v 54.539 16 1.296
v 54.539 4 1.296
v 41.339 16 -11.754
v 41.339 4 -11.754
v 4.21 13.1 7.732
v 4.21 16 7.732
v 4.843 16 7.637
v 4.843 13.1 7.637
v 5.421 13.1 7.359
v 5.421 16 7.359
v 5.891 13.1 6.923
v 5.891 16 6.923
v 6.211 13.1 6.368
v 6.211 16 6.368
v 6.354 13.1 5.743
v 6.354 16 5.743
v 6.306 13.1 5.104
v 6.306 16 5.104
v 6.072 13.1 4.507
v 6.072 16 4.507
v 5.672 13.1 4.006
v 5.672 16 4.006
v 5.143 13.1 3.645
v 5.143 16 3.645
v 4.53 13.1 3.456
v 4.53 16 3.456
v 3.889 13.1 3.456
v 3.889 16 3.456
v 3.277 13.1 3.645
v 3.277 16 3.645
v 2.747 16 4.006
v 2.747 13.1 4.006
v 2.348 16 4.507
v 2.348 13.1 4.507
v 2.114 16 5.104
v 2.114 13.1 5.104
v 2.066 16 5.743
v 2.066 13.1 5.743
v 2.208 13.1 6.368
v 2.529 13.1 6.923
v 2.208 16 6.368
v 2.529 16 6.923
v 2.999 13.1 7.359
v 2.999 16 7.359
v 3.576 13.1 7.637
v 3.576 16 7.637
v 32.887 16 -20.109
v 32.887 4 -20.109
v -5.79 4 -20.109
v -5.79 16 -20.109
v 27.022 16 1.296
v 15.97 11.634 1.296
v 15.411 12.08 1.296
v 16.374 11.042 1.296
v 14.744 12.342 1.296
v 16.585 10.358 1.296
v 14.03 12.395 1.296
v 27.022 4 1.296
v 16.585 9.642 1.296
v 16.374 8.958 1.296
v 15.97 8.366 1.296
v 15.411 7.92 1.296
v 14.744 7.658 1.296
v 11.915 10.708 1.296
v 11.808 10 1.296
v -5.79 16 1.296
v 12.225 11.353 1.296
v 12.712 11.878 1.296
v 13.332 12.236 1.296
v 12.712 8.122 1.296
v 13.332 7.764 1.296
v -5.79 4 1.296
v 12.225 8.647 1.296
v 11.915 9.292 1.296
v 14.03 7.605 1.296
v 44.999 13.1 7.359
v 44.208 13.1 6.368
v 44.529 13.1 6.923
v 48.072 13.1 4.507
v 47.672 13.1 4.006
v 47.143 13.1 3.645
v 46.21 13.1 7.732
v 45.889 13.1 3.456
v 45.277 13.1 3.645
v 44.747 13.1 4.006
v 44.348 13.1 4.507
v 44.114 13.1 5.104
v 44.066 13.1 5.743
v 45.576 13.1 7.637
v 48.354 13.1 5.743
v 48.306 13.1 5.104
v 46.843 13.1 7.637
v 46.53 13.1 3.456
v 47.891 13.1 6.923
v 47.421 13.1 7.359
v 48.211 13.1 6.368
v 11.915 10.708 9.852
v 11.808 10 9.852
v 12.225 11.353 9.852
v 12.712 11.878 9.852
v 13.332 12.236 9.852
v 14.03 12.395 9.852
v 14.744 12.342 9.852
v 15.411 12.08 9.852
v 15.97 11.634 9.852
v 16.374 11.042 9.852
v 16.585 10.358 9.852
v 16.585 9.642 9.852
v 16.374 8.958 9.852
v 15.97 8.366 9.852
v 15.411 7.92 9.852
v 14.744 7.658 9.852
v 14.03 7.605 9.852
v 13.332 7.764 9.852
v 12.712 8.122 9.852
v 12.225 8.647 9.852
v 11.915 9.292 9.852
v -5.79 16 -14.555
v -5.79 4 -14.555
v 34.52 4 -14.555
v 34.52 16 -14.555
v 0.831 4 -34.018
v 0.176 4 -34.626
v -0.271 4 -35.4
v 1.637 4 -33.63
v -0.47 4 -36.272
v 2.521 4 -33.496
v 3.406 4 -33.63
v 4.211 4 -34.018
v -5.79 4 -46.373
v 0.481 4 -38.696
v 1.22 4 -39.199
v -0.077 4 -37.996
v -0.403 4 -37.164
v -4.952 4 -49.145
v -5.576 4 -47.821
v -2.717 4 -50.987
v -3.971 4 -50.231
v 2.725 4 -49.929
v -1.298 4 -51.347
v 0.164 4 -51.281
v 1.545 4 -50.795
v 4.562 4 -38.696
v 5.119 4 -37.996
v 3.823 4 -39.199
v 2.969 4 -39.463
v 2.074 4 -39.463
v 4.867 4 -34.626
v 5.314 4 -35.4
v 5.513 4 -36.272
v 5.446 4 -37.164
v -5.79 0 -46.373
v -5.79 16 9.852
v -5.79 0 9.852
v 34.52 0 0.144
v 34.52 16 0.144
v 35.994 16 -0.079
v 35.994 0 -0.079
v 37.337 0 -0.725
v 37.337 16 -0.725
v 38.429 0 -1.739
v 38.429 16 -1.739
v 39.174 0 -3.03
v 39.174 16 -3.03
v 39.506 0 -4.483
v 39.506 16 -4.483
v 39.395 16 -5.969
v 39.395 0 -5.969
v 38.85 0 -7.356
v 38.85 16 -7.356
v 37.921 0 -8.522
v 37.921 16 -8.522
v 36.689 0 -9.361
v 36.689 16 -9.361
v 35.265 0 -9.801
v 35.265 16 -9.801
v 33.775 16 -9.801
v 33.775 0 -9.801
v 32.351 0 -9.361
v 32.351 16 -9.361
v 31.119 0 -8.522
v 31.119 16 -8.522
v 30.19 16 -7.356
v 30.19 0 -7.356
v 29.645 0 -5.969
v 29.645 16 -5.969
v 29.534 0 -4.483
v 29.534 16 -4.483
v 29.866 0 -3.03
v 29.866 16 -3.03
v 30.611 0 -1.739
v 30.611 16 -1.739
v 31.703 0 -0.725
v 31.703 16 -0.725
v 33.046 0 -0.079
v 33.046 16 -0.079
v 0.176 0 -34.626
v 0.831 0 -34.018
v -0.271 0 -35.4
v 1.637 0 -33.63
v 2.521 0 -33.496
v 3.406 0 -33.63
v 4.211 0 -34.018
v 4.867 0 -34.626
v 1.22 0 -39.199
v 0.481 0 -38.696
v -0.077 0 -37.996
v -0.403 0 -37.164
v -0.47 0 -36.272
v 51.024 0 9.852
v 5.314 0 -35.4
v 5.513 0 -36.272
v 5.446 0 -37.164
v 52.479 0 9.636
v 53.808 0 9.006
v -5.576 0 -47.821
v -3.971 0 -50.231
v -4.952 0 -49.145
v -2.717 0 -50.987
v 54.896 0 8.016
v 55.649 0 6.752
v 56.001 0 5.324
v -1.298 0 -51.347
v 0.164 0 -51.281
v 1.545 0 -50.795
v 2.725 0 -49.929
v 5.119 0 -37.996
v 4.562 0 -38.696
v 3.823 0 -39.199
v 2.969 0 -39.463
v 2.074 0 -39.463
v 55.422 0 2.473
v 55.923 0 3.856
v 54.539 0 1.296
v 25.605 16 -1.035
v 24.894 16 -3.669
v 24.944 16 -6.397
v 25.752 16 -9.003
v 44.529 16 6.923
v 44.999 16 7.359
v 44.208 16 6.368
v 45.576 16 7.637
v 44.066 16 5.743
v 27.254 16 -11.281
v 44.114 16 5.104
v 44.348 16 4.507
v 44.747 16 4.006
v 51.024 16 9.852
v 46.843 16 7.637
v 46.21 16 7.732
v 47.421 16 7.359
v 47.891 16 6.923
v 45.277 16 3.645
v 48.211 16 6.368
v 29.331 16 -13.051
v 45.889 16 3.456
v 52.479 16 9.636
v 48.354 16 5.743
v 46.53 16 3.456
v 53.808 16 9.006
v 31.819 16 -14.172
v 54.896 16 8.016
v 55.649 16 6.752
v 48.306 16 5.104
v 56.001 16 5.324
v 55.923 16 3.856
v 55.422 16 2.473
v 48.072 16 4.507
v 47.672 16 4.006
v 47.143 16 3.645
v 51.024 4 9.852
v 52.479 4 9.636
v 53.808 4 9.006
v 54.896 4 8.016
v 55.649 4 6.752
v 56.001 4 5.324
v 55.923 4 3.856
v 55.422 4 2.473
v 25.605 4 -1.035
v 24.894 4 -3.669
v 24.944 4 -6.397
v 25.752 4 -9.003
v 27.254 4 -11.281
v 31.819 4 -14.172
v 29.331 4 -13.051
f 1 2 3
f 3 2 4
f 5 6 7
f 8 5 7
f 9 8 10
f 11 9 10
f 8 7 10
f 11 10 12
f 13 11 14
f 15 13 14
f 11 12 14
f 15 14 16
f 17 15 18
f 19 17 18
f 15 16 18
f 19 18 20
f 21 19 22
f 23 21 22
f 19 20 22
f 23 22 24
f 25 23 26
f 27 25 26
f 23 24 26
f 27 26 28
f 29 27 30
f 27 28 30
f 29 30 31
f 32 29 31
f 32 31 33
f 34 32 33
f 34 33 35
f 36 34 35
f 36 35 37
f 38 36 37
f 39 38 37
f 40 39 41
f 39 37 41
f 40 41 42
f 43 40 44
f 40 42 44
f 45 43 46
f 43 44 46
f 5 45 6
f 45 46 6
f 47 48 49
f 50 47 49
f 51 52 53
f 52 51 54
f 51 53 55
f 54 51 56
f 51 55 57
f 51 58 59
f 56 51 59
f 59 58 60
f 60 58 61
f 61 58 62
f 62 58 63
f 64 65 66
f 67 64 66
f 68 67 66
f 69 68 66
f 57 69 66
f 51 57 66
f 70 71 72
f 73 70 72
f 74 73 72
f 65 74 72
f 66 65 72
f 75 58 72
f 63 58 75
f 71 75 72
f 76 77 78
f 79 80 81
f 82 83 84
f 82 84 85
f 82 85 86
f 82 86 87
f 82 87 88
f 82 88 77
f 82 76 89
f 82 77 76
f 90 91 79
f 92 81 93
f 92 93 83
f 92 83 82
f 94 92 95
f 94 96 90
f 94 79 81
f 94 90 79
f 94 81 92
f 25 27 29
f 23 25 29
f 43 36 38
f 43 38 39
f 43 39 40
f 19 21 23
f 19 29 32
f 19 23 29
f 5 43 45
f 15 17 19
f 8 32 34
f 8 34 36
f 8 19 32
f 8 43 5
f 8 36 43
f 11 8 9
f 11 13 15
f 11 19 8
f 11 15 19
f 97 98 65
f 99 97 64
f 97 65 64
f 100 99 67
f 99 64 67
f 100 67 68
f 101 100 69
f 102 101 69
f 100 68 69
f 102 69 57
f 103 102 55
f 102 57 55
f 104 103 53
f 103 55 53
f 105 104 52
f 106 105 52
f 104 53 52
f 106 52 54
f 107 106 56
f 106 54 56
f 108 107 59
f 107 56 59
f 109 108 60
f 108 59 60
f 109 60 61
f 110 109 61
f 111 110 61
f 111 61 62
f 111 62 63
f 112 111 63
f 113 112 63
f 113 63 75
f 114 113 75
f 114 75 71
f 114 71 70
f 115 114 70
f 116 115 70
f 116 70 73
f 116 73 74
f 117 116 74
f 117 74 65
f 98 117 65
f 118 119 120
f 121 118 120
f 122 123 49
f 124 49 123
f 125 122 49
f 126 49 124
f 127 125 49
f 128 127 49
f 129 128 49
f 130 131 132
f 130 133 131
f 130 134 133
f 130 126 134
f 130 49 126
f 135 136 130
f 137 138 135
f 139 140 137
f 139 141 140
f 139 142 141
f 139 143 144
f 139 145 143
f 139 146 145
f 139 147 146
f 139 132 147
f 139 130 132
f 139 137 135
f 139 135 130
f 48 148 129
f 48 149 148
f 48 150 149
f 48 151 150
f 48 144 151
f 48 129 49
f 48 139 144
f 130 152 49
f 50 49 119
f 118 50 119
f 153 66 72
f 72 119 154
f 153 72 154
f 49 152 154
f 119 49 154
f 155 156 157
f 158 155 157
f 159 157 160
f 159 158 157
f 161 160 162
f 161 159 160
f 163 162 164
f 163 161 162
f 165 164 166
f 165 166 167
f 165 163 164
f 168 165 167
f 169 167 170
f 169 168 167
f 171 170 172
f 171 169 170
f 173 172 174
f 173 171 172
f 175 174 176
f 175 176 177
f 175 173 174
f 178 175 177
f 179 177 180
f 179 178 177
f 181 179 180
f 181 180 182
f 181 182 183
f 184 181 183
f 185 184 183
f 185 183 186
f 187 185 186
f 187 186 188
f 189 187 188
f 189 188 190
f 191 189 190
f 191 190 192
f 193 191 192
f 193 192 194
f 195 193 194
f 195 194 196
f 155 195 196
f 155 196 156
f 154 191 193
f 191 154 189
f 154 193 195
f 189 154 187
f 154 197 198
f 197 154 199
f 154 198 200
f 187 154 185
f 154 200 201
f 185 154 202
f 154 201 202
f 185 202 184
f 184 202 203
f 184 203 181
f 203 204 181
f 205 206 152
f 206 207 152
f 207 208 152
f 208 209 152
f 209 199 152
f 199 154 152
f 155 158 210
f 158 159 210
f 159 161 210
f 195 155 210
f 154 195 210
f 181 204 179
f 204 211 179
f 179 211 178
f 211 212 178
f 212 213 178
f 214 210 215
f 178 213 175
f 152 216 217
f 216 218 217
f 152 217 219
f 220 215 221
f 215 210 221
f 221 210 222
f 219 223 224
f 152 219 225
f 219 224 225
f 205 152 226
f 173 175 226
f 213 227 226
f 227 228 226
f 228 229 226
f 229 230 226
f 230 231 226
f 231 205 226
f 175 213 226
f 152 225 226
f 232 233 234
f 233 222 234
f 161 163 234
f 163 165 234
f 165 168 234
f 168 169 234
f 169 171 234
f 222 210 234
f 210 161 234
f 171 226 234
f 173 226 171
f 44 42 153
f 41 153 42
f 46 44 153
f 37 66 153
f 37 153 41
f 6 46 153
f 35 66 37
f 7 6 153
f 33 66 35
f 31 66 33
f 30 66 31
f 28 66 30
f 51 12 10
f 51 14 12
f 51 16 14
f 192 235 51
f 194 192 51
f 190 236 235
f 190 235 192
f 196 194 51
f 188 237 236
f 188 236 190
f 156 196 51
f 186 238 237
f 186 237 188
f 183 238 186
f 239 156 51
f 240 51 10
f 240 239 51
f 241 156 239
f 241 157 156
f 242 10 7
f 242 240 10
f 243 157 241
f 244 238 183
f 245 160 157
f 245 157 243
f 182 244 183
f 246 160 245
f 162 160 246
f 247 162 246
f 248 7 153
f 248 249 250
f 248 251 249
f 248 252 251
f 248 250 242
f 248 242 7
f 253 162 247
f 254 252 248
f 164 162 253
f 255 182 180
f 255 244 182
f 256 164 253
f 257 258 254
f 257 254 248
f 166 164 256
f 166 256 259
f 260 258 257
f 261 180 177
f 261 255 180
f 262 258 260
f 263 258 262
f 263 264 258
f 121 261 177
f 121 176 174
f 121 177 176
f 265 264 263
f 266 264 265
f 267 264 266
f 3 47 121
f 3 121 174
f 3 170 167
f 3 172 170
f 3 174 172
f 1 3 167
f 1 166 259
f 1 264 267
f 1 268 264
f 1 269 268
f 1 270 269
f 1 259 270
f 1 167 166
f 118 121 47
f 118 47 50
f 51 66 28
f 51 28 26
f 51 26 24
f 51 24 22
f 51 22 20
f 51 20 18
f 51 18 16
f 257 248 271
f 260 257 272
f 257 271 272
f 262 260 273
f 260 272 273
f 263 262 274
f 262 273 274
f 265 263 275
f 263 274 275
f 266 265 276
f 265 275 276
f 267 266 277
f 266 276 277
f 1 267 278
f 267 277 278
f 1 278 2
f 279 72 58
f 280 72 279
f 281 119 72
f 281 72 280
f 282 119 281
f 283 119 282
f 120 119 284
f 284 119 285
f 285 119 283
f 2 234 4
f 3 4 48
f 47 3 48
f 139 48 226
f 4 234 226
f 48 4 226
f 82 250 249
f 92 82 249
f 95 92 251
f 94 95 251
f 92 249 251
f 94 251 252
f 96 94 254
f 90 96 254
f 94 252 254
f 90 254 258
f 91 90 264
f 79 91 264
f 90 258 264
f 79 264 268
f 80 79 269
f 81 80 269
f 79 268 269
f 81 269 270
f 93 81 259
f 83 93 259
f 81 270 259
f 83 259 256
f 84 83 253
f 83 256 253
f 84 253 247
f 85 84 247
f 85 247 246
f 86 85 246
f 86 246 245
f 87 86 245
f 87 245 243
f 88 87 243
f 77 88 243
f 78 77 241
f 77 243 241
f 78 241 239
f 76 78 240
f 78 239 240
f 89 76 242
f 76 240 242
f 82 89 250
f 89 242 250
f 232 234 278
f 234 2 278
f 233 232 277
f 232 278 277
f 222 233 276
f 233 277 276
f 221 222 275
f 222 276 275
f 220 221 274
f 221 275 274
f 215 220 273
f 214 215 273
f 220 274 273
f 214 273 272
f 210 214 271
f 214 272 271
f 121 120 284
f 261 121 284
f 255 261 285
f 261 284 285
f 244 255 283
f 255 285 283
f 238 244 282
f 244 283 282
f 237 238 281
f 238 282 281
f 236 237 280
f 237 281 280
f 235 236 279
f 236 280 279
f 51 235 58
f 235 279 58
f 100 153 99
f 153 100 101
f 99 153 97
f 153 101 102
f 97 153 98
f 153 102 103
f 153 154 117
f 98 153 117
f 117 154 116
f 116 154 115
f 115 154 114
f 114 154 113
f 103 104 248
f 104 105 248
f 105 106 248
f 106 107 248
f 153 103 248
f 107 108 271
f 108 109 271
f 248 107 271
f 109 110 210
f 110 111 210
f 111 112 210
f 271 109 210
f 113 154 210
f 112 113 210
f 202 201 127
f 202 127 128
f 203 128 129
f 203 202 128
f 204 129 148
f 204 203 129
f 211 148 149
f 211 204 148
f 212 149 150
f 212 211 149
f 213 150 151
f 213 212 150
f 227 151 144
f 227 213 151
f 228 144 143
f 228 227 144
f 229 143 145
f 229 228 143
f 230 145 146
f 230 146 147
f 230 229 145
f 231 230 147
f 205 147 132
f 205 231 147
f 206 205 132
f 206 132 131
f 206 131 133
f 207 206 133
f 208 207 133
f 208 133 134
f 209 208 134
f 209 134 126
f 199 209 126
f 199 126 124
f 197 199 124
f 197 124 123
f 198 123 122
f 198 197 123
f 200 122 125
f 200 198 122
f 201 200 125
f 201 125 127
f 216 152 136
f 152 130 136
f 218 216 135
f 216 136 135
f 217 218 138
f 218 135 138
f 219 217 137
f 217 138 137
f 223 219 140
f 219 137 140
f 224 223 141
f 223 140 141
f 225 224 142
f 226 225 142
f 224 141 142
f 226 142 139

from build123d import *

# Parameters (mm, degrees)
SKETCH1_R           = 3
SKETCH1_R_2         = 5
BOSS_EXTRUDE1_DEPTH = 4
FILLET1_R           = 5
SKETCH2_R           = 5
BOSS_EXTRUDE2_DEPTH = 12
SKETCH4_R           = 2.401871641
CUT_EXTRUDE2_DEPTH  = 30
SKETCH6_R           = 2.15
CUT_EXTRUDE3_DEPTH  = 2.9


with BuildPart() as part:
    # Sketch1 → Boss-Extrude1 (new body)
    with BuildSketch(Plane(origin=(0, 0, 0), x_dir=(1, 0, 0), z_dir=(0, 1, 0))):
        Polygon((-5.790326763, 58.347363117), (-5.790326763, -9.85213545), (63.193084095, -9.85213545), align=None)
        with Locations(Location((2.52138652, 36.496379496, 0), (0, 0, 270))):
            Circle(SKETCH1_R, mode=Mode.SUBTRACT)
        with Locations(Location((34.519986489, 4.856379496, 0), (0, 0, 270))):
            Circle(SKETCH1_R_2, mode=Mode.SUBTRACT)
    extrude(amount=BOSS_EXTRUDE1_DEPTH)

    # Fillet1
    fillet1_edges = [part.edges().sort_by_distance(p)[0] for p in [
        (63.193084095, 2, 9.85213545),
        (-5.790326763, 2, -58.347363117),
    ]]
    fillet(fillet1_edges, radius=FILLET1_R)

    # Sketch2 → Boss-Extrude2 (add)
    # profile 1 of 5: a face of its own
    with BuildSketch(Plane(origin=(0, 4, 0), x_dir=(1, 0, 0), z_dir=(0, 1, 0))):
        with BuildLine():
            Line((42.017536623, -1.29645629), (54.539062539, -1.29645629))
            Line((54.539062539, -1.29645629), (41.338915092, 11.753687589))
            ThreePointArc((41.338915092, 11.753687589), (43.470054942, 8.593613888), (44.21898882, 4.856379496))
            ThreePointArc((44.21898882, 4.856379496), (43.65205642, 1.588973033), (42.017536623, -1.29645629))
        make_face()
    # profile 2 of 5: a face of its own
    with BuildSketch(Plane(origin=(0, 4, 0), x_dir=(1, 0, 0), z_dir=(0, 1, 0))):
        with BuildLine():
            ThreePointArc((51.023789334, -9.85213545), (55.648635051, -6.752346517), (54.539062539, -1.29645629))
            Line((54.539062539, -1.29645629), (42.017536623, -1.29645629))
            ThreePointArc((42.017536623, -1.29645629), (34.519986489, -4.842622834), (27.022436356, -1.29645629))
            Line((27.022436356, -1.29645629), (-5.790326763, -1.29645629))
            Line((-5.790326763, -1.29645629), (-5.790326763, -9.85213545))
            Line((-5.790326763, -9.85213545), (51.023789334, -9.85213545))
        make_face()
    # profile 3 of 5: a face of its own
    with BuildSketch(Plane(origin=(0, 4, 0), x_dir=(1, 0, 0), z_dir=(0, 1, 0))):
        with BuildLine():
            ThreePointArc((27.022436356, -1.29645629), (34.519986489, -4.842622834), (42.017536623, -1.29645629))
            Line((42.017536623, -1.29645629), (27.022436356, -1.29645629))
        make_face()
    # profile 4 of 5: a face of its own
    with BuildSketch(Plane(origin=(0, 4, 0), x_dir=(1, 0, 0), z_dir=(0, 1, 0))):
        with BuildLine():
            ThreePointArc((34.519986489, 14.555381827), (38.206016803, 13.827657373), (41.338915092, 11.753687589))
            Line((41.338915092, 11.753687589), (32.887372323, 20.109188887))
            Line((32.887372323, 20.109188887), (-5.790326763, 20.109188887))
            Line((-5.790326763, 20.109188887), (-5.790326763, 14.555381827))
            Line((-5.790326763, 14.555381827), (34.519986489, 14.555381827))
        make_face()
    # profile 5 of 5: a face of its own
    with BuildSketch(Plane(origin=(0, 4, 0), x_dir=(1, 0, 0), z_dir=(0, 1, 0))):
        with BuildLine():
            Line((27.022436356, -1.29645629), (42.017536623, -1.29645629))
            ThreePointArc((42.017536623, -1.29645629), (43.65205642, 1.588973033), (44.21898882, 4.856379496))
            ThreePointArc((44.21898882, 4.856379496), (43.470054942, 8.593613888), (41.338915092, 11.753687589))
            ThreePointArc((41.338915092, 11.753687589), (38.206016803, 13.827657373), (34.519986489, 14.555381827))
            ThreePointArc((34.519986489, 14.555381827), (25.752232648, 9.003322803), (27.022436356, -1.29645629))
        make_face()
        with Locations(Location((34.519986489, 4.856379496, 0), (0, 0, 270))):
            Circle(SKETCH2_R, mode=Mode.SUBTRACT)
    extrude(amount=BOSS_EXTRUDE2_DEPTH)

    # Sketch4 → Cut-Extrude2 (cut)
    with BuildSketch(Plane(origin=(0, 0, 1.29645629), x_dir=(-1, 0, 0), z_dir=(0, 0, -1))):
        with Locations((-14.209673237, 10)):
            Circle(SKETCH4_R)
    extrude(amount=-CUT_EXTRUDE2_DEPTH, mode=Mode.SUBTRACT)

    # Sketch6 → Cut-Extrude3 (cut)
    with BuildSketch(Plane(origin=(0, 16, 0), x_dir=(1, 0, 0), z_dir=(0, 1, 0))):
        with Locations(Location((46.209673237, -5.58213545, 0), (0, 0, 270))):
            Circle(SKETCH6_R)
        with Locations(Location((4.209673237, -5.58213545, 0), (0, 0, 270))):
            Circle(SKETCH6_R)
    extrude(amount=-CUT_EXTRUDE3_DEPTH, mode=Mode.SUBTRACT)


solid = part.part
